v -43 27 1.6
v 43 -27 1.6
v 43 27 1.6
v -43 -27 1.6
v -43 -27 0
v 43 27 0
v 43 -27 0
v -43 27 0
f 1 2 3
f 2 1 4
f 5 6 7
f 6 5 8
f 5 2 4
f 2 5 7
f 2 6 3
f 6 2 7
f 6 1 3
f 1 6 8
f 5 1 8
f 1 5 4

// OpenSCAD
// Seed OpenSCAD file for task 01; complete it from 01_kicad_mechanical_map.csv.
$fn = 32;
board = [86.000, 54.000, 1.600];
wall = 3.000;
module placeholder_board() {
  translate([-board[0]/2, -board[1]/2, 0]) cube(board);
}
placeholder_board();
